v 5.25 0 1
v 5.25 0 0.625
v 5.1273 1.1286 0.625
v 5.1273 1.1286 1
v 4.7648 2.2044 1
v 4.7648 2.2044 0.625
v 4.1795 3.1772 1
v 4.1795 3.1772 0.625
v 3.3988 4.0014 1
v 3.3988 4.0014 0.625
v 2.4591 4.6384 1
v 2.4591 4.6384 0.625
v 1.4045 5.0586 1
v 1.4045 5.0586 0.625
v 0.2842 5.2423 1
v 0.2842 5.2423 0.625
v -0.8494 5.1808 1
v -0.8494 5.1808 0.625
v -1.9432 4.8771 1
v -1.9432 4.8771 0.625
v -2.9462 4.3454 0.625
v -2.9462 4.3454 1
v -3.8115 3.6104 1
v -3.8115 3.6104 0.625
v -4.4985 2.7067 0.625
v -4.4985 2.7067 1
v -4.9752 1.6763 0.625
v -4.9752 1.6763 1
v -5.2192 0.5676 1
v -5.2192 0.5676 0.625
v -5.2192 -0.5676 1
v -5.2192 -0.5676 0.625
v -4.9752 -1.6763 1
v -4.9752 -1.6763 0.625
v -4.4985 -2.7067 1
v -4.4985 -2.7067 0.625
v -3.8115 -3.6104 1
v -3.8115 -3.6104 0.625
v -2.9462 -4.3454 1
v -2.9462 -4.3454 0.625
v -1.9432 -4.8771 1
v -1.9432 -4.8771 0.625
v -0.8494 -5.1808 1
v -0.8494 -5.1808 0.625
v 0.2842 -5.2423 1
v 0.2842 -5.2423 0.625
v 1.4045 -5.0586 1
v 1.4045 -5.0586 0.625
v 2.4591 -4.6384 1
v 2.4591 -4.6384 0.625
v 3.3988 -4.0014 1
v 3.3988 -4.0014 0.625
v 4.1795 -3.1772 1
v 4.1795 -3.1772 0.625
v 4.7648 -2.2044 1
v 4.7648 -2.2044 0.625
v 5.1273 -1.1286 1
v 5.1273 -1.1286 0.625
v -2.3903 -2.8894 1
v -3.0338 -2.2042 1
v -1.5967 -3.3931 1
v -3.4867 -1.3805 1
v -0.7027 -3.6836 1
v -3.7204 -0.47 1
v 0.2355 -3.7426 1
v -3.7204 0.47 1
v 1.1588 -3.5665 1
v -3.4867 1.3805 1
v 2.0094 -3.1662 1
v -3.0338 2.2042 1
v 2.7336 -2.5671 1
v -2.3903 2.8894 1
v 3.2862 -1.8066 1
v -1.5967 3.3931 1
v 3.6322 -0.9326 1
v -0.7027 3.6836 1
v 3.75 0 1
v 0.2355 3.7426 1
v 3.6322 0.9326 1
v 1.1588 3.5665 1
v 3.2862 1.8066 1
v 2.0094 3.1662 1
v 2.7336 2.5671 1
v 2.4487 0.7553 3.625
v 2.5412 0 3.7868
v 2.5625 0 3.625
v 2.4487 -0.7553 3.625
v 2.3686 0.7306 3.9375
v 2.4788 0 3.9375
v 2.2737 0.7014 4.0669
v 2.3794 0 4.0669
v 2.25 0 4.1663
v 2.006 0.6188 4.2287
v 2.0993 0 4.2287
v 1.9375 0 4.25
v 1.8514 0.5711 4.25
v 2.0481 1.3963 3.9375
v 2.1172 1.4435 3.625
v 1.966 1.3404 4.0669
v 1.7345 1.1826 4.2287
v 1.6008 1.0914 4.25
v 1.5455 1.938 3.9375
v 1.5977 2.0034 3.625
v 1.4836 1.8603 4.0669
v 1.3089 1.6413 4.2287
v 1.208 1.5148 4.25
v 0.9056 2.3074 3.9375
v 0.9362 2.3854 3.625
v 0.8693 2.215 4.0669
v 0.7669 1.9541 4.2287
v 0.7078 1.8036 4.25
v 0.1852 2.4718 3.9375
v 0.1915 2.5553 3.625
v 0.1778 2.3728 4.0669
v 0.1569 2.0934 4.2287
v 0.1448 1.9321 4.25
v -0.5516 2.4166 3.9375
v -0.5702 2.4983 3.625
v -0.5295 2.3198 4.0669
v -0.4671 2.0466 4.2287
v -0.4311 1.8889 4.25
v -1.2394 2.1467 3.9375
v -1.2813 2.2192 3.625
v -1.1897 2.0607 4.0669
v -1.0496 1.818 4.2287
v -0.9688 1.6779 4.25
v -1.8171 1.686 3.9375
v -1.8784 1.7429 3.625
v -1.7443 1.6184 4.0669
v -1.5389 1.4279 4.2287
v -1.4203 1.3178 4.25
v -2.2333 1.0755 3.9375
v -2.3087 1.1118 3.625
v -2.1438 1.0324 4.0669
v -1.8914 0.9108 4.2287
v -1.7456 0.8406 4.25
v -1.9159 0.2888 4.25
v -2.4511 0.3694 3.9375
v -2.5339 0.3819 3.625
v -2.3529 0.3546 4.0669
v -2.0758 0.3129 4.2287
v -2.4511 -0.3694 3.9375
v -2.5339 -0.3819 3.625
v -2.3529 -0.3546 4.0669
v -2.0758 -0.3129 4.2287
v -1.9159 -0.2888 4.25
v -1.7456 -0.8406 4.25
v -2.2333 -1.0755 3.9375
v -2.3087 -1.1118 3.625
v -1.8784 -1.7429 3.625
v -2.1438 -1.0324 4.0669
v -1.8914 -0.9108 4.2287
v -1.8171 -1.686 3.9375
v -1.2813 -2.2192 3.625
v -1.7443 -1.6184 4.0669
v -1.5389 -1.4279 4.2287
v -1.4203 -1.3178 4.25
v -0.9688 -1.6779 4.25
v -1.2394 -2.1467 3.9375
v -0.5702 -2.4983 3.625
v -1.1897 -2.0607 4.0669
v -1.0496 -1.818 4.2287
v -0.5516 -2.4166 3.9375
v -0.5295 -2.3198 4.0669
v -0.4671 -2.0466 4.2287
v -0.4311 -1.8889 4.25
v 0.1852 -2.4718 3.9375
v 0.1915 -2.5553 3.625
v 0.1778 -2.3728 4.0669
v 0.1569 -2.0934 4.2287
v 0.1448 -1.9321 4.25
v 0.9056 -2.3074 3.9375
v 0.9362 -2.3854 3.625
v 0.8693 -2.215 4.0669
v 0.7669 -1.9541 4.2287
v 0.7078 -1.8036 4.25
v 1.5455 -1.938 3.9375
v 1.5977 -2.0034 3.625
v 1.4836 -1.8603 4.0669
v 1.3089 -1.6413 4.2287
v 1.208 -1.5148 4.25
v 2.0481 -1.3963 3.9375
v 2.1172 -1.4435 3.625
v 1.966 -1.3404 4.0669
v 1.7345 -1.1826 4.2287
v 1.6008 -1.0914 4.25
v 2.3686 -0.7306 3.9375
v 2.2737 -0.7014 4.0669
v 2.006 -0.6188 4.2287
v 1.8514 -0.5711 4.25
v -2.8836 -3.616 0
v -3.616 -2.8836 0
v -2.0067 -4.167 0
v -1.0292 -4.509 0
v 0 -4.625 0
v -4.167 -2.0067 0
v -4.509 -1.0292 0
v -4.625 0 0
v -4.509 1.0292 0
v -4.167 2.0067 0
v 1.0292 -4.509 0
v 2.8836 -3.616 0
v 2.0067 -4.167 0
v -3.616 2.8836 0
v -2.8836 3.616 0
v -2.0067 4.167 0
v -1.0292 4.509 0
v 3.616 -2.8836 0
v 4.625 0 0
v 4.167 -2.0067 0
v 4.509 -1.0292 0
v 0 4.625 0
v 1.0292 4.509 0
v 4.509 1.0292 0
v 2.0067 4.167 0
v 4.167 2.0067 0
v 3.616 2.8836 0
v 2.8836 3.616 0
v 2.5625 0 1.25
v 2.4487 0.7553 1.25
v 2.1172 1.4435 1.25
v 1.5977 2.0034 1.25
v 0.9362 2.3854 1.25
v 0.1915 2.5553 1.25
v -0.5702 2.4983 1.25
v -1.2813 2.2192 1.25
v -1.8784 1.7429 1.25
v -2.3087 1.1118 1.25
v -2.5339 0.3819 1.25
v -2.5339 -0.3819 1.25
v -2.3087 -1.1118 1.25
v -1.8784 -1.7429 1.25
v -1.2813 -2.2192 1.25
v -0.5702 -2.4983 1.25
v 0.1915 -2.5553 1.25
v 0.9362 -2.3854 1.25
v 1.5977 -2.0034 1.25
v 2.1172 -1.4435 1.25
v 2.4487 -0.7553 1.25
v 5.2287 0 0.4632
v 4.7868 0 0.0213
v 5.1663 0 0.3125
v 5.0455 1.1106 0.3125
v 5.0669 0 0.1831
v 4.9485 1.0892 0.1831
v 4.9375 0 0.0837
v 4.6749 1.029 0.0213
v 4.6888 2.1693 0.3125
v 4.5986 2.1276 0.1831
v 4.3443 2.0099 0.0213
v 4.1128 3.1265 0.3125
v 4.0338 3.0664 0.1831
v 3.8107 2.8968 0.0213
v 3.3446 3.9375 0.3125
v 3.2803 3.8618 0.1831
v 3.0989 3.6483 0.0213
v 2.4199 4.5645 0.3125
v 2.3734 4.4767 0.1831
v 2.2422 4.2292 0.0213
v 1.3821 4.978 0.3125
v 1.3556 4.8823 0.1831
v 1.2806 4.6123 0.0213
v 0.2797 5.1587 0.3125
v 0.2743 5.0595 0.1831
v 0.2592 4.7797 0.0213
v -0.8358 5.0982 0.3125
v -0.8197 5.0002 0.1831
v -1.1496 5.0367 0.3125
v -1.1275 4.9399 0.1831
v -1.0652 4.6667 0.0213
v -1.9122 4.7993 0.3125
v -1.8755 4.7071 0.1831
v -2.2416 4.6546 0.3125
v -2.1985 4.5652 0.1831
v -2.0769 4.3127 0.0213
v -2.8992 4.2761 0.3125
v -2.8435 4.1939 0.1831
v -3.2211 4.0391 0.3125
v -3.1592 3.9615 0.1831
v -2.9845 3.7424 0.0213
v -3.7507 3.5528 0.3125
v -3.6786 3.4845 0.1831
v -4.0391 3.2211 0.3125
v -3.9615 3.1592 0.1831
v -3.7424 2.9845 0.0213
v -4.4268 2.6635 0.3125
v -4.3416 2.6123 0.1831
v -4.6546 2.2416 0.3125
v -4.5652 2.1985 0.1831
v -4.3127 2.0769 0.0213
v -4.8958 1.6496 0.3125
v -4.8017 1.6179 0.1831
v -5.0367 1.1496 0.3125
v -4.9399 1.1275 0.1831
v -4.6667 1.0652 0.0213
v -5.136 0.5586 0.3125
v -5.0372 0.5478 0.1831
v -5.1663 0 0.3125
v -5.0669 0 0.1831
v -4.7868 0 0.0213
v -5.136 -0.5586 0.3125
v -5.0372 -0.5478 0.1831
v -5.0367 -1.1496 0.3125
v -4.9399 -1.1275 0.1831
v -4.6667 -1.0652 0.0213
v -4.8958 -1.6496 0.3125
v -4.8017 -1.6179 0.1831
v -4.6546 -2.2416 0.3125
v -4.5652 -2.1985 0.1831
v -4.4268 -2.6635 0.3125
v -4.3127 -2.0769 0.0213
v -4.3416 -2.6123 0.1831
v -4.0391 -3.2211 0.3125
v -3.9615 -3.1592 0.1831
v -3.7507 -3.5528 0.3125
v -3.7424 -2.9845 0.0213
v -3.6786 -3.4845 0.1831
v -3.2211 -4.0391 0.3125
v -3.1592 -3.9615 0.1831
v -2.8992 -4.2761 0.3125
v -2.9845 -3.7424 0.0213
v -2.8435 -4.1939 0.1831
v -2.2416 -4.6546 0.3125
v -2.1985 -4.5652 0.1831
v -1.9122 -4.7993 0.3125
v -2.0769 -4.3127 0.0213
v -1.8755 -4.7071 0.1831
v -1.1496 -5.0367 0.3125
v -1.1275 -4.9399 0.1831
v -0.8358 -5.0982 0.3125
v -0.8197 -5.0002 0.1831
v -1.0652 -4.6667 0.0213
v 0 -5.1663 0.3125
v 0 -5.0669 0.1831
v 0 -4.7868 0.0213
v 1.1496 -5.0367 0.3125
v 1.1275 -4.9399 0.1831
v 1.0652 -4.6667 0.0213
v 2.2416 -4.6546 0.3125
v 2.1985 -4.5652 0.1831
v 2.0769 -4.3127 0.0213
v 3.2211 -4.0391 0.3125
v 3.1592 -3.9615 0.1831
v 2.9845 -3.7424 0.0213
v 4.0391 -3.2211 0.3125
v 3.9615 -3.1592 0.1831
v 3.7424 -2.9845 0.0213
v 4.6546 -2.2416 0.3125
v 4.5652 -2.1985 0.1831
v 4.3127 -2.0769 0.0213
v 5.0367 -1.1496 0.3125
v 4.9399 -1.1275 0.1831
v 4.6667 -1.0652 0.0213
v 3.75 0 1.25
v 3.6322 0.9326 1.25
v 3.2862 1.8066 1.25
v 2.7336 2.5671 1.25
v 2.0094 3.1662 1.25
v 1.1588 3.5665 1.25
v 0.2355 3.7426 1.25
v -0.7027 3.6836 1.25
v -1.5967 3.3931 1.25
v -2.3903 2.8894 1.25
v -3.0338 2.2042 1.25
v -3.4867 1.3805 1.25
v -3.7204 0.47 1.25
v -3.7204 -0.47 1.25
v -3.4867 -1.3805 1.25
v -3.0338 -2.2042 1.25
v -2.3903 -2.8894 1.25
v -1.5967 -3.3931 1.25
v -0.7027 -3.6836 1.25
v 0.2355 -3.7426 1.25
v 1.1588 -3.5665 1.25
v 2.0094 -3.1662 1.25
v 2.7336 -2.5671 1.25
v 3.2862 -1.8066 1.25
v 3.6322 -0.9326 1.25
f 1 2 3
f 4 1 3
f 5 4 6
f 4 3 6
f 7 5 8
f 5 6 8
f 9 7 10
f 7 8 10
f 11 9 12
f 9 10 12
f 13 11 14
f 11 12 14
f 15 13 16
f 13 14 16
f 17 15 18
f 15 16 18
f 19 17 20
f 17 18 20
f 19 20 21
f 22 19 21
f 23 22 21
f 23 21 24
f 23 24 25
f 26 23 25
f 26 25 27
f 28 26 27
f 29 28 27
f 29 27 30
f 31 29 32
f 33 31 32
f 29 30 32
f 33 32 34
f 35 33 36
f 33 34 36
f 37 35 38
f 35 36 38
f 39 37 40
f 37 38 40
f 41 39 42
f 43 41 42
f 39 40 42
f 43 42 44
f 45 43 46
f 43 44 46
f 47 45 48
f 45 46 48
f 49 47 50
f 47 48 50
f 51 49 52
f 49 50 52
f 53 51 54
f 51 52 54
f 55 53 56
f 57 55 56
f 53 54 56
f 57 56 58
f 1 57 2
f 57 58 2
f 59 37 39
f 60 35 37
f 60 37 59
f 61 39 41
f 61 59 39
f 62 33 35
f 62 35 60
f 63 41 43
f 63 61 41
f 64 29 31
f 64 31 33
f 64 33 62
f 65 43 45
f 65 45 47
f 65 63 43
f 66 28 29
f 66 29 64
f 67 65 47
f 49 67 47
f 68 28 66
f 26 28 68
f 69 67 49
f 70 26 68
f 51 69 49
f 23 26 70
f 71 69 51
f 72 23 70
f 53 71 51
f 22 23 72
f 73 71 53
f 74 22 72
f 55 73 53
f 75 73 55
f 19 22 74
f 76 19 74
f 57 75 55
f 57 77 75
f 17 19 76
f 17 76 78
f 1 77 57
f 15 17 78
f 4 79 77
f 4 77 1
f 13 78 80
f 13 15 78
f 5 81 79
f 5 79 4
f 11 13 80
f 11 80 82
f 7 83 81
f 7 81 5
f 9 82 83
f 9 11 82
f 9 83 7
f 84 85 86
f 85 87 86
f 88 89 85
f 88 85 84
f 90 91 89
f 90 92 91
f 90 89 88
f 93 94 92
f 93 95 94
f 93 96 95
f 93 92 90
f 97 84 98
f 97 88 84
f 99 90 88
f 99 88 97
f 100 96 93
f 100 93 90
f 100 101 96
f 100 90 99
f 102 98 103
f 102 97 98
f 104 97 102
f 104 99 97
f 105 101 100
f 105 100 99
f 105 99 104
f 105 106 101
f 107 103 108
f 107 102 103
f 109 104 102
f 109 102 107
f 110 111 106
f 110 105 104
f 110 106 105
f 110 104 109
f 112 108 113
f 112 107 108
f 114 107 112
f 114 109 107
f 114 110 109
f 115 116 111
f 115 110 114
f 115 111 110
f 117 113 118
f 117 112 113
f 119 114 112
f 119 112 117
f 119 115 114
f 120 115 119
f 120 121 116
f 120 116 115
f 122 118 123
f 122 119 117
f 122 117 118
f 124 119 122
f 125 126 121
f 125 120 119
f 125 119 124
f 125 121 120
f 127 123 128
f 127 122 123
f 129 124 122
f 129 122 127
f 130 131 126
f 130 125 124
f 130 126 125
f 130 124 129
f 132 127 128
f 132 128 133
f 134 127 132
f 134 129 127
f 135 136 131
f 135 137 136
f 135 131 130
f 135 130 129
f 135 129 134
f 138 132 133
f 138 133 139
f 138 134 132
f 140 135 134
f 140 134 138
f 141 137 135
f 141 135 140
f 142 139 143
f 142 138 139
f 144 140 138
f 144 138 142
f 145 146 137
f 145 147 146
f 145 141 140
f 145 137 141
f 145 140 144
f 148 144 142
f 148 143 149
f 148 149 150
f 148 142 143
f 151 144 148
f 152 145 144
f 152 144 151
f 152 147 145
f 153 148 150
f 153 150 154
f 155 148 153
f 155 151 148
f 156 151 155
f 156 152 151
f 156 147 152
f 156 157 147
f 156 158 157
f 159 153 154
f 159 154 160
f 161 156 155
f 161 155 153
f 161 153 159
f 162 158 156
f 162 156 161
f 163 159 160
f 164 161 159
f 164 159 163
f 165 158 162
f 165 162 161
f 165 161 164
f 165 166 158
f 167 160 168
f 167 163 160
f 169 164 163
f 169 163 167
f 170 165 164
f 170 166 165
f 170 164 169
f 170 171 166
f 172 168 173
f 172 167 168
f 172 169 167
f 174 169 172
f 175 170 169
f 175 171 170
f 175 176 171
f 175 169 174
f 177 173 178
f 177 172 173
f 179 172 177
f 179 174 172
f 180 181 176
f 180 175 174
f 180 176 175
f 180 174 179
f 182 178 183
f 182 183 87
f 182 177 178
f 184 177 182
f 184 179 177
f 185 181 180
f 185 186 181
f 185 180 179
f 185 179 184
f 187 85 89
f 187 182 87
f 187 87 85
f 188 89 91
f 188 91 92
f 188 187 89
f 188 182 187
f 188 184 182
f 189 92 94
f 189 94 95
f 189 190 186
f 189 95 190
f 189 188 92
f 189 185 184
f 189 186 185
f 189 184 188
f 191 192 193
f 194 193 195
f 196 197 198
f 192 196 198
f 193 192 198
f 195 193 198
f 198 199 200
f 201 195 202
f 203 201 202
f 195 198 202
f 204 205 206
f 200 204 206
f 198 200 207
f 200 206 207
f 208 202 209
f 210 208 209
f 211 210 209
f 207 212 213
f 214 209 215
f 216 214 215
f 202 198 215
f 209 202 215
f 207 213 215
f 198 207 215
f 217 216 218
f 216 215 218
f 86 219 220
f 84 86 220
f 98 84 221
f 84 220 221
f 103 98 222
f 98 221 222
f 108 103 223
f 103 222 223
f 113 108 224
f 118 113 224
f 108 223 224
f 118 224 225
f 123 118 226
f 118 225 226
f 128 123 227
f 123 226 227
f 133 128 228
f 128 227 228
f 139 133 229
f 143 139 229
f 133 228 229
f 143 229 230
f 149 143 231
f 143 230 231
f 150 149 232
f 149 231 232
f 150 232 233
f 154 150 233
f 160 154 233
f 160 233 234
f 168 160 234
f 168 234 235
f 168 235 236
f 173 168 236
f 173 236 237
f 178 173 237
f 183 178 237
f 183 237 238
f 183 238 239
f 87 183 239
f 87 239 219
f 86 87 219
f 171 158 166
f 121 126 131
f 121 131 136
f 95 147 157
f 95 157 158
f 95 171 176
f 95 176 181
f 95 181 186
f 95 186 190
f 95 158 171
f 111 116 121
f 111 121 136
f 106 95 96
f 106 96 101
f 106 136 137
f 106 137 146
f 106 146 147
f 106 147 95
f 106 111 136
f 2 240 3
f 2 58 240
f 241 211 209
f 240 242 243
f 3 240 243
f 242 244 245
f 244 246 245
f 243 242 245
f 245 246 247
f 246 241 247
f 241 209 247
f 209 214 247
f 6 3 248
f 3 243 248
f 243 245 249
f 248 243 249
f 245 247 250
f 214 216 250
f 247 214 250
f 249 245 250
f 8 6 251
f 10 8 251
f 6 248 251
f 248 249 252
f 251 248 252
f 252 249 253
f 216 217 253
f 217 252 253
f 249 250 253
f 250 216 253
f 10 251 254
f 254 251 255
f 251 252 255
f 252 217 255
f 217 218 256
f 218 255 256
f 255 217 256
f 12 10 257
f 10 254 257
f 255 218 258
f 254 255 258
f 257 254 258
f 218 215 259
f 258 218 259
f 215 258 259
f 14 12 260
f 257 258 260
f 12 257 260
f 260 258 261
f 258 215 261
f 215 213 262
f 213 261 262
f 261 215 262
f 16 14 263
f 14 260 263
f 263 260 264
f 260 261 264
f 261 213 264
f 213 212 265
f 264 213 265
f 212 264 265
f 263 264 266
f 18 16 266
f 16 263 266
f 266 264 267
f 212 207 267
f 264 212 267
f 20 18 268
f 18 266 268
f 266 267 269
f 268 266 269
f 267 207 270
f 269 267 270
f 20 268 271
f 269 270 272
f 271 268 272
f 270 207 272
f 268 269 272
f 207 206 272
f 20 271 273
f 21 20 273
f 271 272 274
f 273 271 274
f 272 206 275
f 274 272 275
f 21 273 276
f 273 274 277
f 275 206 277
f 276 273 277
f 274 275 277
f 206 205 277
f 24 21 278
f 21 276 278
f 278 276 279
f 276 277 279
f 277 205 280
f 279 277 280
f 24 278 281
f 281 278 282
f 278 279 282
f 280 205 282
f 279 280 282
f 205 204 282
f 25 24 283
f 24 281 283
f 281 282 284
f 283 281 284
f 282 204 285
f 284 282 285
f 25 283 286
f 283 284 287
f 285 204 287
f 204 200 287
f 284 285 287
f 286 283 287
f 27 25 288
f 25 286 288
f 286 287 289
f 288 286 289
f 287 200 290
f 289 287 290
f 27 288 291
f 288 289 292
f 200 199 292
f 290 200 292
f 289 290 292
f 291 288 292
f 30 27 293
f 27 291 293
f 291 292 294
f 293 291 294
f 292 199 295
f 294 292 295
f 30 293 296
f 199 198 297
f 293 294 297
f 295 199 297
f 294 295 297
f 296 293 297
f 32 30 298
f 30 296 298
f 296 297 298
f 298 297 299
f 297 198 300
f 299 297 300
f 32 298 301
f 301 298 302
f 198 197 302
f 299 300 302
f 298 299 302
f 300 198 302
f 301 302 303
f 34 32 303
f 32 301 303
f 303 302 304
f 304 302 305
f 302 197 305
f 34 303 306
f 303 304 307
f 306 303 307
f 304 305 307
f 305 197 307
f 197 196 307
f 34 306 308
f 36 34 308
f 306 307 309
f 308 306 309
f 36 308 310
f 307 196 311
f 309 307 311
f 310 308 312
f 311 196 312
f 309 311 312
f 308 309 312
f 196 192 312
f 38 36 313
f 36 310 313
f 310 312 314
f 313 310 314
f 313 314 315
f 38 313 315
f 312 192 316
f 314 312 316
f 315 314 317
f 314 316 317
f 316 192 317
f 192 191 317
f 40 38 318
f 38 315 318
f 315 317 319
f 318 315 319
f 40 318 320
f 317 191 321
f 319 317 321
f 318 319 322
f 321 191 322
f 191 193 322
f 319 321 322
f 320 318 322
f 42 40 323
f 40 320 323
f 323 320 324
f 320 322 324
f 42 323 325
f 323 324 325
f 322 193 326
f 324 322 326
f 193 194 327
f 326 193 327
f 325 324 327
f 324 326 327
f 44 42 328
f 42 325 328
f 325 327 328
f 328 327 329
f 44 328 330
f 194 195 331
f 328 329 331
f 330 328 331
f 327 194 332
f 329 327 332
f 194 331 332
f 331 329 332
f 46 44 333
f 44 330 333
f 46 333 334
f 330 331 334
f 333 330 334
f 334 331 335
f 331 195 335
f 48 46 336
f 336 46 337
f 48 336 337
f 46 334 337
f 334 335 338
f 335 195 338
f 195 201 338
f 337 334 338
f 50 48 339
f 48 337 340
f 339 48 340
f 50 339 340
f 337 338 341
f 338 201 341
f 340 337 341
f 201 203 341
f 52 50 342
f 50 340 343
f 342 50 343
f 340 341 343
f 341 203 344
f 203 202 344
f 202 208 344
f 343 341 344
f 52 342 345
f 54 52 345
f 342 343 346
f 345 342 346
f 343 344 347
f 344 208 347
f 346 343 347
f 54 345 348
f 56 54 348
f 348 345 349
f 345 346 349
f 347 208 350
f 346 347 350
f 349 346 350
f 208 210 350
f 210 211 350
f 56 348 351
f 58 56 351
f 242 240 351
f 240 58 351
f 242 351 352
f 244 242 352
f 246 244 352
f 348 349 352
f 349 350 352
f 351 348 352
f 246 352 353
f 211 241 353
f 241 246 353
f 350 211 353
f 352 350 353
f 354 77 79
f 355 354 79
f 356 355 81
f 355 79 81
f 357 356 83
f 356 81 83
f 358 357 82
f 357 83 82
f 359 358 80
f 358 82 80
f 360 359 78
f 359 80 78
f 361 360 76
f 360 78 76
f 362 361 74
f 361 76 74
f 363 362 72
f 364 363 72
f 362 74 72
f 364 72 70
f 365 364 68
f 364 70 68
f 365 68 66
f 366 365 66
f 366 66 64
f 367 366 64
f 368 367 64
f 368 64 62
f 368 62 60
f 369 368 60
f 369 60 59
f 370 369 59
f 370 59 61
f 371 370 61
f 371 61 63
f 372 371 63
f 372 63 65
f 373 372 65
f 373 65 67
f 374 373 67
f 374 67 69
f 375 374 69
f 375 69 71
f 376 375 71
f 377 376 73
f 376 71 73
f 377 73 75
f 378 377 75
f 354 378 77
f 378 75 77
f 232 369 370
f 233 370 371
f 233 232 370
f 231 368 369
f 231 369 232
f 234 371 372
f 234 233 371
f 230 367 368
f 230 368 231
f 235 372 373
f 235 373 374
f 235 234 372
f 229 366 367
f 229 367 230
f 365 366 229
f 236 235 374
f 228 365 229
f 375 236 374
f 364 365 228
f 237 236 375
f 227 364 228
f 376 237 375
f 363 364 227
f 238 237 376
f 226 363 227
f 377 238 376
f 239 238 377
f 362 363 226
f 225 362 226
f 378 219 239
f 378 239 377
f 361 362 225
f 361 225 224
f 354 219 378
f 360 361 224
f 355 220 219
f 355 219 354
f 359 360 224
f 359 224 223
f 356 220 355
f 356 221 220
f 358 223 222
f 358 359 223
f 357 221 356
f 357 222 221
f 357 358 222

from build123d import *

# Parameters (mm, degrees)
F0_R     = 2.5625
F1_DEPTH = 4.25
F0_R_2   = 3.75
F2_DEPTH = 1.25
F0_R_3   = 5.25
F3_DEPTH = 1
F4_R     = 0.625


with BuildPart() as f1:
    # F0 (on Top) → F1 (new body)
    with BuildSketch(Plane.XY):
        Circle(F0_R)
    extrude(amount=F1_DEPTH)

    # F0 (on Top) → F2 (join)
    with BuildSketch(Plane.XY):
        Circle(F0_R_2)
        Circle(F0_R, mode=Mode.SUBTRACT)
    extrude(amount=F2_DEPTH)

    # F0 (on Top) → F3 (join)
    with BuildSketch(Plane.XY):
        Circle(F0_R_3)
        Circle(F0_R_2, mode=Mode.SUBTRACT)
    extrude(amount=F3_DEPTH)

    # F4
    f4_edges = [f1.edges().sort_by_distance(p)[0] for p in [
        (-5.25, 0, 0),
        (-2.5625, 0, 4.25),
    ]]
    fillet(f4_edges, radius=F4_R)


solid = f1.part
